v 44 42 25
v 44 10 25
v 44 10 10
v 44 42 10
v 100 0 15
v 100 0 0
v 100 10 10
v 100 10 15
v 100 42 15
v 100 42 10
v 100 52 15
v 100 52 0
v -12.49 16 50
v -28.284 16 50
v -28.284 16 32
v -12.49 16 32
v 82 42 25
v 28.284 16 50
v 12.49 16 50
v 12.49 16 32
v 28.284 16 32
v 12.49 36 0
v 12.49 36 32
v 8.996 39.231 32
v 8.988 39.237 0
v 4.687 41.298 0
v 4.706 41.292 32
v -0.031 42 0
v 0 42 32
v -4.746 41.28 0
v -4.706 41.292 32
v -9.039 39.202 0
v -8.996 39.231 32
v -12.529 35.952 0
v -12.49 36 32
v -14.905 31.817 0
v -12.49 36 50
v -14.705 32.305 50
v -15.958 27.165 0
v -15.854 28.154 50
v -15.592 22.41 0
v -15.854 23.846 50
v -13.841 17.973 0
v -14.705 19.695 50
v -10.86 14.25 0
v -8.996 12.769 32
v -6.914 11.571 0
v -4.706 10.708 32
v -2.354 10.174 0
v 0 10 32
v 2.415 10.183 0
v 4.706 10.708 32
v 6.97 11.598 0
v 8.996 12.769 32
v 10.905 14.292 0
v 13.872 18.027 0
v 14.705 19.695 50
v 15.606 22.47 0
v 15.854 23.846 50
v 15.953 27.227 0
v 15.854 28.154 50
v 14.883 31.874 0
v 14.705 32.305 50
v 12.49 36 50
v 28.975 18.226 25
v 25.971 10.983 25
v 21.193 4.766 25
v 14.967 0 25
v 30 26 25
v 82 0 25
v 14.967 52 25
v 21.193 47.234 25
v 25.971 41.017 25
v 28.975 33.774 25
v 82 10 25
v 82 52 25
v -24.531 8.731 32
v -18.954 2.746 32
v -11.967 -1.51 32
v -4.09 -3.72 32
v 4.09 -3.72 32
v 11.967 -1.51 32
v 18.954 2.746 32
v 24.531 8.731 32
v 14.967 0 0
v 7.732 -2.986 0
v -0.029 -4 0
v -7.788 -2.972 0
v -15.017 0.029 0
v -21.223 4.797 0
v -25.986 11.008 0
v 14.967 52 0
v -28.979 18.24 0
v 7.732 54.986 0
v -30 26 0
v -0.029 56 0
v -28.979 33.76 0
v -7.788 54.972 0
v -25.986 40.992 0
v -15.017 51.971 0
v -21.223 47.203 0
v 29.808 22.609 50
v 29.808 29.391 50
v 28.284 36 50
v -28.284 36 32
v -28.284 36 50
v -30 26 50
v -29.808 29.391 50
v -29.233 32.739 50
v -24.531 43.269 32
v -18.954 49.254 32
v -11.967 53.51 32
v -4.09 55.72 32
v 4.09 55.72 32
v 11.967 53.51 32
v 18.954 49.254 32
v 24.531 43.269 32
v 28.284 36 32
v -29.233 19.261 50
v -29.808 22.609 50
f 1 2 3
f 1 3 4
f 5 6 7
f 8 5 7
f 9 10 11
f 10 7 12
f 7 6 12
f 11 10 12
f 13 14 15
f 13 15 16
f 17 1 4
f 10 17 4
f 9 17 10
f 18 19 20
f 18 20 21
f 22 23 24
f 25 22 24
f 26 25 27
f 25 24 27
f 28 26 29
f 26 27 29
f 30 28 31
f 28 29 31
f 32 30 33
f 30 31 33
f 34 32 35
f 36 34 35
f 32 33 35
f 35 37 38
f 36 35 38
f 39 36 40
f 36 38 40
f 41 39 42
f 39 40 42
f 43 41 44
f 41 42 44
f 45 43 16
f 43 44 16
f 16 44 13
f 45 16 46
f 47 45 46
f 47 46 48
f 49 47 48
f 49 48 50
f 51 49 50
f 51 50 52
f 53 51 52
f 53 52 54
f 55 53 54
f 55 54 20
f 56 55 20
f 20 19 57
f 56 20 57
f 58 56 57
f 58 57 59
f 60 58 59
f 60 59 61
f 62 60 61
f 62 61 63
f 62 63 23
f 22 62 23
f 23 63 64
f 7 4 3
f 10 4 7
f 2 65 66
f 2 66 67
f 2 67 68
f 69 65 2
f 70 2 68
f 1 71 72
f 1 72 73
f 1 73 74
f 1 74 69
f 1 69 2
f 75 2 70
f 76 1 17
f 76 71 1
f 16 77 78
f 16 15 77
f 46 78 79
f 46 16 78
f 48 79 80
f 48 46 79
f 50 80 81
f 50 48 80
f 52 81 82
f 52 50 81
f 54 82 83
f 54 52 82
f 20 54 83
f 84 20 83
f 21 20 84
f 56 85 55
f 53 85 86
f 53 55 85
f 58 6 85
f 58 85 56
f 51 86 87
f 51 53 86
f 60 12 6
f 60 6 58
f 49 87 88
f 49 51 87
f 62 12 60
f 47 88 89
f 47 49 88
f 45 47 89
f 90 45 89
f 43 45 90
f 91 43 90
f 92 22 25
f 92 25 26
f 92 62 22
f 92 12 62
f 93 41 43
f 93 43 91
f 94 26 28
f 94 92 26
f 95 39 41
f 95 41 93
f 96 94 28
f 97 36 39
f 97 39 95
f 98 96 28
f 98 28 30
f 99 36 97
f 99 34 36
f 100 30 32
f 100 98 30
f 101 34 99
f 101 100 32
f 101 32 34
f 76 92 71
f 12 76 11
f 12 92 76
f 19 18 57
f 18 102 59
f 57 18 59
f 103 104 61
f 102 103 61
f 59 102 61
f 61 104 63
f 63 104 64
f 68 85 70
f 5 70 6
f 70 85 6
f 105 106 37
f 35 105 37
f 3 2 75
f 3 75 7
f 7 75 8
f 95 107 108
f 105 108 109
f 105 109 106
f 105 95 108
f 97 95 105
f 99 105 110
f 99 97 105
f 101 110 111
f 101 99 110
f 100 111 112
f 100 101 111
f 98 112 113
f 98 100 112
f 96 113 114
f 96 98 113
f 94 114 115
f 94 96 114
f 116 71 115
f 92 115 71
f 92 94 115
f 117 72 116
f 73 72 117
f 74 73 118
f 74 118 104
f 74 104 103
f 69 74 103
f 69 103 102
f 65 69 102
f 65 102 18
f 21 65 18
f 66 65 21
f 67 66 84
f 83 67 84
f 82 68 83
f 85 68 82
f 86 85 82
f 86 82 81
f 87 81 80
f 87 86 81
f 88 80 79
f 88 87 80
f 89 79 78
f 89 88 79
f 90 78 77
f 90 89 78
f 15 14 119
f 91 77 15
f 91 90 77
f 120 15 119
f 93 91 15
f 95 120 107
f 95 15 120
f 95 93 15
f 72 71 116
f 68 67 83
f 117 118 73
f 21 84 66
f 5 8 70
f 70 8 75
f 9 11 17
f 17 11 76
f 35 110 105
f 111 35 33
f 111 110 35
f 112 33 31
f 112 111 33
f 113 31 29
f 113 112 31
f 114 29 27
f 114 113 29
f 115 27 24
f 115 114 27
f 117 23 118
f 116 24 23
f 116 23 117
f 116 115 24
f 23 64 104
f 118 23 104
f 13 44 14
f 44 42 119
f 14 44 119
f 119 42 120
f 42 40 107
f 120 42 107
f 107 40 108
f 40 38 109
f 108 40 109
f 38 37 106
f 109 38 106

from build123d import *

# Parameters (mm, degrees)
SKETCH1_W           = 100
SKETCH1_H           = 52
BOSS_EXTRUDE1_DEPTH = 25
SKETCH2_R           = 30
BOSS_EXTRUDE2_DEPTH = 50
CUT_EXTRUDE1_REACH  = 127.044
SKETCH4_W           = 56
SKETCH4_H           = 32
CUT_EXTRUDE2_DEPTH  = 15
SKETCH5_OUTSIDE_W   = 162.332
SKETCH5_OUTSIDE_H   = 92.332
SKETCH5_OUTSIDE_W_2 = 73.851546866
SKETCH5_OUTSIDE_H_2 = 20
CUT_EXTRUDE3_DEPTH  = 18
CUT_EXTRUDE4_REACH  = 127.044
SKETCH6_R           = 16


with BuildPart() as part:
    # Sketch1 → Boss-Extrude1 (new body)
    with BuildSketch(Plane.XY):
        with Locations((50, 26)):
            Rectangle(SKETCH1_W, SKETCH1_H)
    extrude(amount=BOSS_EXTRUDE1_DEPTH)

    # Sketch2 → Boss-Extrude2 (add)
    with BuildSketch(Plane(origin=(0, 0, 0), x_dir=(-1, 0, 0), z_dir=(0, 0, -1))):
        with Locations((0, 26)):
            Circle(SKETCH2_R)
    extrude(amount=-BOSS_EXTRUDE2_DEPTH)

    # Sketch3 → Cut-Extrude1 (cut, up to next)
    with BuildSketch(Plane(origin=(0, 52, 0), x_dir=(1, 0, 0), z_dir=(0, 1, 0)), mode=Mode.PRIVATE) as cut_extrude1_sk1:
        Polygon((100, -25), (100, -15), (82, -25), align=None)
    cut_extrude1_tool1 = extrude(cut_extrude1_sk1.sketch, amount=-CUT_EXTRUDE1_REACH, mode=Mode.PRIVATE) & part.part
    add(cut_extrude1_tool1.solids().sort_by_distance((94, 52, 21.666667))[0], mode=Mode.SUBTRACT)

    # Sketch4 → Cut-Extrude2 (cut)
    with BuildSketch(Plane.XY.offset(25)):
        with Locations((72, 26)):
            Rectangle(SKETCH4_W, SKETCH4_H)
    extrude(amount=-CUT_EXTRUDE2_DEPTH, mode=Mode.SUBTRACT)

    # Sketch5 outside → Cut-Extrude3 (cut)
    with BuildSketch(Plane.XY.offset(50)):
        with Locations((35, 26)):
            Rectangle(SKETCH5_OUTSIDE_W, SKETCH5_OUTSIDE_H)
        with Locations((0, 26)):
            Rectangle(SKETCH5_OUTSIDE_W_2, SKETCH5_OUTSIDE_H_2, mode=Mode.SUBTRACT)
    extrude(amount=-CUT_EXTRUDE3_DEPTH, mode=Mode.SUBTRACT)

    # Sketch6 → Cut-Extrude4 (cut, up to next)
    with BuildSketch(Plane.XY.offset(50), mode=Mode.PRIVATE) as cut_extrude4_sk1:
        with Locations(Location((0, 26, 0), (0, 0, 38.682187453))):
            Circle(SKETCH6_R)
    cut_extrude4_tool1 = extrude(cut_extrude4_sk1.sketch, amount=-CUT_EXTRUDE4_REACH, mode=Mode.PRIVATE) & part.part
    add(cut_extrude4_tool1.solids().sort_by_distance((0, 26, 50))[0], mode=Mode.SUBTRACT)


solid = part.part
